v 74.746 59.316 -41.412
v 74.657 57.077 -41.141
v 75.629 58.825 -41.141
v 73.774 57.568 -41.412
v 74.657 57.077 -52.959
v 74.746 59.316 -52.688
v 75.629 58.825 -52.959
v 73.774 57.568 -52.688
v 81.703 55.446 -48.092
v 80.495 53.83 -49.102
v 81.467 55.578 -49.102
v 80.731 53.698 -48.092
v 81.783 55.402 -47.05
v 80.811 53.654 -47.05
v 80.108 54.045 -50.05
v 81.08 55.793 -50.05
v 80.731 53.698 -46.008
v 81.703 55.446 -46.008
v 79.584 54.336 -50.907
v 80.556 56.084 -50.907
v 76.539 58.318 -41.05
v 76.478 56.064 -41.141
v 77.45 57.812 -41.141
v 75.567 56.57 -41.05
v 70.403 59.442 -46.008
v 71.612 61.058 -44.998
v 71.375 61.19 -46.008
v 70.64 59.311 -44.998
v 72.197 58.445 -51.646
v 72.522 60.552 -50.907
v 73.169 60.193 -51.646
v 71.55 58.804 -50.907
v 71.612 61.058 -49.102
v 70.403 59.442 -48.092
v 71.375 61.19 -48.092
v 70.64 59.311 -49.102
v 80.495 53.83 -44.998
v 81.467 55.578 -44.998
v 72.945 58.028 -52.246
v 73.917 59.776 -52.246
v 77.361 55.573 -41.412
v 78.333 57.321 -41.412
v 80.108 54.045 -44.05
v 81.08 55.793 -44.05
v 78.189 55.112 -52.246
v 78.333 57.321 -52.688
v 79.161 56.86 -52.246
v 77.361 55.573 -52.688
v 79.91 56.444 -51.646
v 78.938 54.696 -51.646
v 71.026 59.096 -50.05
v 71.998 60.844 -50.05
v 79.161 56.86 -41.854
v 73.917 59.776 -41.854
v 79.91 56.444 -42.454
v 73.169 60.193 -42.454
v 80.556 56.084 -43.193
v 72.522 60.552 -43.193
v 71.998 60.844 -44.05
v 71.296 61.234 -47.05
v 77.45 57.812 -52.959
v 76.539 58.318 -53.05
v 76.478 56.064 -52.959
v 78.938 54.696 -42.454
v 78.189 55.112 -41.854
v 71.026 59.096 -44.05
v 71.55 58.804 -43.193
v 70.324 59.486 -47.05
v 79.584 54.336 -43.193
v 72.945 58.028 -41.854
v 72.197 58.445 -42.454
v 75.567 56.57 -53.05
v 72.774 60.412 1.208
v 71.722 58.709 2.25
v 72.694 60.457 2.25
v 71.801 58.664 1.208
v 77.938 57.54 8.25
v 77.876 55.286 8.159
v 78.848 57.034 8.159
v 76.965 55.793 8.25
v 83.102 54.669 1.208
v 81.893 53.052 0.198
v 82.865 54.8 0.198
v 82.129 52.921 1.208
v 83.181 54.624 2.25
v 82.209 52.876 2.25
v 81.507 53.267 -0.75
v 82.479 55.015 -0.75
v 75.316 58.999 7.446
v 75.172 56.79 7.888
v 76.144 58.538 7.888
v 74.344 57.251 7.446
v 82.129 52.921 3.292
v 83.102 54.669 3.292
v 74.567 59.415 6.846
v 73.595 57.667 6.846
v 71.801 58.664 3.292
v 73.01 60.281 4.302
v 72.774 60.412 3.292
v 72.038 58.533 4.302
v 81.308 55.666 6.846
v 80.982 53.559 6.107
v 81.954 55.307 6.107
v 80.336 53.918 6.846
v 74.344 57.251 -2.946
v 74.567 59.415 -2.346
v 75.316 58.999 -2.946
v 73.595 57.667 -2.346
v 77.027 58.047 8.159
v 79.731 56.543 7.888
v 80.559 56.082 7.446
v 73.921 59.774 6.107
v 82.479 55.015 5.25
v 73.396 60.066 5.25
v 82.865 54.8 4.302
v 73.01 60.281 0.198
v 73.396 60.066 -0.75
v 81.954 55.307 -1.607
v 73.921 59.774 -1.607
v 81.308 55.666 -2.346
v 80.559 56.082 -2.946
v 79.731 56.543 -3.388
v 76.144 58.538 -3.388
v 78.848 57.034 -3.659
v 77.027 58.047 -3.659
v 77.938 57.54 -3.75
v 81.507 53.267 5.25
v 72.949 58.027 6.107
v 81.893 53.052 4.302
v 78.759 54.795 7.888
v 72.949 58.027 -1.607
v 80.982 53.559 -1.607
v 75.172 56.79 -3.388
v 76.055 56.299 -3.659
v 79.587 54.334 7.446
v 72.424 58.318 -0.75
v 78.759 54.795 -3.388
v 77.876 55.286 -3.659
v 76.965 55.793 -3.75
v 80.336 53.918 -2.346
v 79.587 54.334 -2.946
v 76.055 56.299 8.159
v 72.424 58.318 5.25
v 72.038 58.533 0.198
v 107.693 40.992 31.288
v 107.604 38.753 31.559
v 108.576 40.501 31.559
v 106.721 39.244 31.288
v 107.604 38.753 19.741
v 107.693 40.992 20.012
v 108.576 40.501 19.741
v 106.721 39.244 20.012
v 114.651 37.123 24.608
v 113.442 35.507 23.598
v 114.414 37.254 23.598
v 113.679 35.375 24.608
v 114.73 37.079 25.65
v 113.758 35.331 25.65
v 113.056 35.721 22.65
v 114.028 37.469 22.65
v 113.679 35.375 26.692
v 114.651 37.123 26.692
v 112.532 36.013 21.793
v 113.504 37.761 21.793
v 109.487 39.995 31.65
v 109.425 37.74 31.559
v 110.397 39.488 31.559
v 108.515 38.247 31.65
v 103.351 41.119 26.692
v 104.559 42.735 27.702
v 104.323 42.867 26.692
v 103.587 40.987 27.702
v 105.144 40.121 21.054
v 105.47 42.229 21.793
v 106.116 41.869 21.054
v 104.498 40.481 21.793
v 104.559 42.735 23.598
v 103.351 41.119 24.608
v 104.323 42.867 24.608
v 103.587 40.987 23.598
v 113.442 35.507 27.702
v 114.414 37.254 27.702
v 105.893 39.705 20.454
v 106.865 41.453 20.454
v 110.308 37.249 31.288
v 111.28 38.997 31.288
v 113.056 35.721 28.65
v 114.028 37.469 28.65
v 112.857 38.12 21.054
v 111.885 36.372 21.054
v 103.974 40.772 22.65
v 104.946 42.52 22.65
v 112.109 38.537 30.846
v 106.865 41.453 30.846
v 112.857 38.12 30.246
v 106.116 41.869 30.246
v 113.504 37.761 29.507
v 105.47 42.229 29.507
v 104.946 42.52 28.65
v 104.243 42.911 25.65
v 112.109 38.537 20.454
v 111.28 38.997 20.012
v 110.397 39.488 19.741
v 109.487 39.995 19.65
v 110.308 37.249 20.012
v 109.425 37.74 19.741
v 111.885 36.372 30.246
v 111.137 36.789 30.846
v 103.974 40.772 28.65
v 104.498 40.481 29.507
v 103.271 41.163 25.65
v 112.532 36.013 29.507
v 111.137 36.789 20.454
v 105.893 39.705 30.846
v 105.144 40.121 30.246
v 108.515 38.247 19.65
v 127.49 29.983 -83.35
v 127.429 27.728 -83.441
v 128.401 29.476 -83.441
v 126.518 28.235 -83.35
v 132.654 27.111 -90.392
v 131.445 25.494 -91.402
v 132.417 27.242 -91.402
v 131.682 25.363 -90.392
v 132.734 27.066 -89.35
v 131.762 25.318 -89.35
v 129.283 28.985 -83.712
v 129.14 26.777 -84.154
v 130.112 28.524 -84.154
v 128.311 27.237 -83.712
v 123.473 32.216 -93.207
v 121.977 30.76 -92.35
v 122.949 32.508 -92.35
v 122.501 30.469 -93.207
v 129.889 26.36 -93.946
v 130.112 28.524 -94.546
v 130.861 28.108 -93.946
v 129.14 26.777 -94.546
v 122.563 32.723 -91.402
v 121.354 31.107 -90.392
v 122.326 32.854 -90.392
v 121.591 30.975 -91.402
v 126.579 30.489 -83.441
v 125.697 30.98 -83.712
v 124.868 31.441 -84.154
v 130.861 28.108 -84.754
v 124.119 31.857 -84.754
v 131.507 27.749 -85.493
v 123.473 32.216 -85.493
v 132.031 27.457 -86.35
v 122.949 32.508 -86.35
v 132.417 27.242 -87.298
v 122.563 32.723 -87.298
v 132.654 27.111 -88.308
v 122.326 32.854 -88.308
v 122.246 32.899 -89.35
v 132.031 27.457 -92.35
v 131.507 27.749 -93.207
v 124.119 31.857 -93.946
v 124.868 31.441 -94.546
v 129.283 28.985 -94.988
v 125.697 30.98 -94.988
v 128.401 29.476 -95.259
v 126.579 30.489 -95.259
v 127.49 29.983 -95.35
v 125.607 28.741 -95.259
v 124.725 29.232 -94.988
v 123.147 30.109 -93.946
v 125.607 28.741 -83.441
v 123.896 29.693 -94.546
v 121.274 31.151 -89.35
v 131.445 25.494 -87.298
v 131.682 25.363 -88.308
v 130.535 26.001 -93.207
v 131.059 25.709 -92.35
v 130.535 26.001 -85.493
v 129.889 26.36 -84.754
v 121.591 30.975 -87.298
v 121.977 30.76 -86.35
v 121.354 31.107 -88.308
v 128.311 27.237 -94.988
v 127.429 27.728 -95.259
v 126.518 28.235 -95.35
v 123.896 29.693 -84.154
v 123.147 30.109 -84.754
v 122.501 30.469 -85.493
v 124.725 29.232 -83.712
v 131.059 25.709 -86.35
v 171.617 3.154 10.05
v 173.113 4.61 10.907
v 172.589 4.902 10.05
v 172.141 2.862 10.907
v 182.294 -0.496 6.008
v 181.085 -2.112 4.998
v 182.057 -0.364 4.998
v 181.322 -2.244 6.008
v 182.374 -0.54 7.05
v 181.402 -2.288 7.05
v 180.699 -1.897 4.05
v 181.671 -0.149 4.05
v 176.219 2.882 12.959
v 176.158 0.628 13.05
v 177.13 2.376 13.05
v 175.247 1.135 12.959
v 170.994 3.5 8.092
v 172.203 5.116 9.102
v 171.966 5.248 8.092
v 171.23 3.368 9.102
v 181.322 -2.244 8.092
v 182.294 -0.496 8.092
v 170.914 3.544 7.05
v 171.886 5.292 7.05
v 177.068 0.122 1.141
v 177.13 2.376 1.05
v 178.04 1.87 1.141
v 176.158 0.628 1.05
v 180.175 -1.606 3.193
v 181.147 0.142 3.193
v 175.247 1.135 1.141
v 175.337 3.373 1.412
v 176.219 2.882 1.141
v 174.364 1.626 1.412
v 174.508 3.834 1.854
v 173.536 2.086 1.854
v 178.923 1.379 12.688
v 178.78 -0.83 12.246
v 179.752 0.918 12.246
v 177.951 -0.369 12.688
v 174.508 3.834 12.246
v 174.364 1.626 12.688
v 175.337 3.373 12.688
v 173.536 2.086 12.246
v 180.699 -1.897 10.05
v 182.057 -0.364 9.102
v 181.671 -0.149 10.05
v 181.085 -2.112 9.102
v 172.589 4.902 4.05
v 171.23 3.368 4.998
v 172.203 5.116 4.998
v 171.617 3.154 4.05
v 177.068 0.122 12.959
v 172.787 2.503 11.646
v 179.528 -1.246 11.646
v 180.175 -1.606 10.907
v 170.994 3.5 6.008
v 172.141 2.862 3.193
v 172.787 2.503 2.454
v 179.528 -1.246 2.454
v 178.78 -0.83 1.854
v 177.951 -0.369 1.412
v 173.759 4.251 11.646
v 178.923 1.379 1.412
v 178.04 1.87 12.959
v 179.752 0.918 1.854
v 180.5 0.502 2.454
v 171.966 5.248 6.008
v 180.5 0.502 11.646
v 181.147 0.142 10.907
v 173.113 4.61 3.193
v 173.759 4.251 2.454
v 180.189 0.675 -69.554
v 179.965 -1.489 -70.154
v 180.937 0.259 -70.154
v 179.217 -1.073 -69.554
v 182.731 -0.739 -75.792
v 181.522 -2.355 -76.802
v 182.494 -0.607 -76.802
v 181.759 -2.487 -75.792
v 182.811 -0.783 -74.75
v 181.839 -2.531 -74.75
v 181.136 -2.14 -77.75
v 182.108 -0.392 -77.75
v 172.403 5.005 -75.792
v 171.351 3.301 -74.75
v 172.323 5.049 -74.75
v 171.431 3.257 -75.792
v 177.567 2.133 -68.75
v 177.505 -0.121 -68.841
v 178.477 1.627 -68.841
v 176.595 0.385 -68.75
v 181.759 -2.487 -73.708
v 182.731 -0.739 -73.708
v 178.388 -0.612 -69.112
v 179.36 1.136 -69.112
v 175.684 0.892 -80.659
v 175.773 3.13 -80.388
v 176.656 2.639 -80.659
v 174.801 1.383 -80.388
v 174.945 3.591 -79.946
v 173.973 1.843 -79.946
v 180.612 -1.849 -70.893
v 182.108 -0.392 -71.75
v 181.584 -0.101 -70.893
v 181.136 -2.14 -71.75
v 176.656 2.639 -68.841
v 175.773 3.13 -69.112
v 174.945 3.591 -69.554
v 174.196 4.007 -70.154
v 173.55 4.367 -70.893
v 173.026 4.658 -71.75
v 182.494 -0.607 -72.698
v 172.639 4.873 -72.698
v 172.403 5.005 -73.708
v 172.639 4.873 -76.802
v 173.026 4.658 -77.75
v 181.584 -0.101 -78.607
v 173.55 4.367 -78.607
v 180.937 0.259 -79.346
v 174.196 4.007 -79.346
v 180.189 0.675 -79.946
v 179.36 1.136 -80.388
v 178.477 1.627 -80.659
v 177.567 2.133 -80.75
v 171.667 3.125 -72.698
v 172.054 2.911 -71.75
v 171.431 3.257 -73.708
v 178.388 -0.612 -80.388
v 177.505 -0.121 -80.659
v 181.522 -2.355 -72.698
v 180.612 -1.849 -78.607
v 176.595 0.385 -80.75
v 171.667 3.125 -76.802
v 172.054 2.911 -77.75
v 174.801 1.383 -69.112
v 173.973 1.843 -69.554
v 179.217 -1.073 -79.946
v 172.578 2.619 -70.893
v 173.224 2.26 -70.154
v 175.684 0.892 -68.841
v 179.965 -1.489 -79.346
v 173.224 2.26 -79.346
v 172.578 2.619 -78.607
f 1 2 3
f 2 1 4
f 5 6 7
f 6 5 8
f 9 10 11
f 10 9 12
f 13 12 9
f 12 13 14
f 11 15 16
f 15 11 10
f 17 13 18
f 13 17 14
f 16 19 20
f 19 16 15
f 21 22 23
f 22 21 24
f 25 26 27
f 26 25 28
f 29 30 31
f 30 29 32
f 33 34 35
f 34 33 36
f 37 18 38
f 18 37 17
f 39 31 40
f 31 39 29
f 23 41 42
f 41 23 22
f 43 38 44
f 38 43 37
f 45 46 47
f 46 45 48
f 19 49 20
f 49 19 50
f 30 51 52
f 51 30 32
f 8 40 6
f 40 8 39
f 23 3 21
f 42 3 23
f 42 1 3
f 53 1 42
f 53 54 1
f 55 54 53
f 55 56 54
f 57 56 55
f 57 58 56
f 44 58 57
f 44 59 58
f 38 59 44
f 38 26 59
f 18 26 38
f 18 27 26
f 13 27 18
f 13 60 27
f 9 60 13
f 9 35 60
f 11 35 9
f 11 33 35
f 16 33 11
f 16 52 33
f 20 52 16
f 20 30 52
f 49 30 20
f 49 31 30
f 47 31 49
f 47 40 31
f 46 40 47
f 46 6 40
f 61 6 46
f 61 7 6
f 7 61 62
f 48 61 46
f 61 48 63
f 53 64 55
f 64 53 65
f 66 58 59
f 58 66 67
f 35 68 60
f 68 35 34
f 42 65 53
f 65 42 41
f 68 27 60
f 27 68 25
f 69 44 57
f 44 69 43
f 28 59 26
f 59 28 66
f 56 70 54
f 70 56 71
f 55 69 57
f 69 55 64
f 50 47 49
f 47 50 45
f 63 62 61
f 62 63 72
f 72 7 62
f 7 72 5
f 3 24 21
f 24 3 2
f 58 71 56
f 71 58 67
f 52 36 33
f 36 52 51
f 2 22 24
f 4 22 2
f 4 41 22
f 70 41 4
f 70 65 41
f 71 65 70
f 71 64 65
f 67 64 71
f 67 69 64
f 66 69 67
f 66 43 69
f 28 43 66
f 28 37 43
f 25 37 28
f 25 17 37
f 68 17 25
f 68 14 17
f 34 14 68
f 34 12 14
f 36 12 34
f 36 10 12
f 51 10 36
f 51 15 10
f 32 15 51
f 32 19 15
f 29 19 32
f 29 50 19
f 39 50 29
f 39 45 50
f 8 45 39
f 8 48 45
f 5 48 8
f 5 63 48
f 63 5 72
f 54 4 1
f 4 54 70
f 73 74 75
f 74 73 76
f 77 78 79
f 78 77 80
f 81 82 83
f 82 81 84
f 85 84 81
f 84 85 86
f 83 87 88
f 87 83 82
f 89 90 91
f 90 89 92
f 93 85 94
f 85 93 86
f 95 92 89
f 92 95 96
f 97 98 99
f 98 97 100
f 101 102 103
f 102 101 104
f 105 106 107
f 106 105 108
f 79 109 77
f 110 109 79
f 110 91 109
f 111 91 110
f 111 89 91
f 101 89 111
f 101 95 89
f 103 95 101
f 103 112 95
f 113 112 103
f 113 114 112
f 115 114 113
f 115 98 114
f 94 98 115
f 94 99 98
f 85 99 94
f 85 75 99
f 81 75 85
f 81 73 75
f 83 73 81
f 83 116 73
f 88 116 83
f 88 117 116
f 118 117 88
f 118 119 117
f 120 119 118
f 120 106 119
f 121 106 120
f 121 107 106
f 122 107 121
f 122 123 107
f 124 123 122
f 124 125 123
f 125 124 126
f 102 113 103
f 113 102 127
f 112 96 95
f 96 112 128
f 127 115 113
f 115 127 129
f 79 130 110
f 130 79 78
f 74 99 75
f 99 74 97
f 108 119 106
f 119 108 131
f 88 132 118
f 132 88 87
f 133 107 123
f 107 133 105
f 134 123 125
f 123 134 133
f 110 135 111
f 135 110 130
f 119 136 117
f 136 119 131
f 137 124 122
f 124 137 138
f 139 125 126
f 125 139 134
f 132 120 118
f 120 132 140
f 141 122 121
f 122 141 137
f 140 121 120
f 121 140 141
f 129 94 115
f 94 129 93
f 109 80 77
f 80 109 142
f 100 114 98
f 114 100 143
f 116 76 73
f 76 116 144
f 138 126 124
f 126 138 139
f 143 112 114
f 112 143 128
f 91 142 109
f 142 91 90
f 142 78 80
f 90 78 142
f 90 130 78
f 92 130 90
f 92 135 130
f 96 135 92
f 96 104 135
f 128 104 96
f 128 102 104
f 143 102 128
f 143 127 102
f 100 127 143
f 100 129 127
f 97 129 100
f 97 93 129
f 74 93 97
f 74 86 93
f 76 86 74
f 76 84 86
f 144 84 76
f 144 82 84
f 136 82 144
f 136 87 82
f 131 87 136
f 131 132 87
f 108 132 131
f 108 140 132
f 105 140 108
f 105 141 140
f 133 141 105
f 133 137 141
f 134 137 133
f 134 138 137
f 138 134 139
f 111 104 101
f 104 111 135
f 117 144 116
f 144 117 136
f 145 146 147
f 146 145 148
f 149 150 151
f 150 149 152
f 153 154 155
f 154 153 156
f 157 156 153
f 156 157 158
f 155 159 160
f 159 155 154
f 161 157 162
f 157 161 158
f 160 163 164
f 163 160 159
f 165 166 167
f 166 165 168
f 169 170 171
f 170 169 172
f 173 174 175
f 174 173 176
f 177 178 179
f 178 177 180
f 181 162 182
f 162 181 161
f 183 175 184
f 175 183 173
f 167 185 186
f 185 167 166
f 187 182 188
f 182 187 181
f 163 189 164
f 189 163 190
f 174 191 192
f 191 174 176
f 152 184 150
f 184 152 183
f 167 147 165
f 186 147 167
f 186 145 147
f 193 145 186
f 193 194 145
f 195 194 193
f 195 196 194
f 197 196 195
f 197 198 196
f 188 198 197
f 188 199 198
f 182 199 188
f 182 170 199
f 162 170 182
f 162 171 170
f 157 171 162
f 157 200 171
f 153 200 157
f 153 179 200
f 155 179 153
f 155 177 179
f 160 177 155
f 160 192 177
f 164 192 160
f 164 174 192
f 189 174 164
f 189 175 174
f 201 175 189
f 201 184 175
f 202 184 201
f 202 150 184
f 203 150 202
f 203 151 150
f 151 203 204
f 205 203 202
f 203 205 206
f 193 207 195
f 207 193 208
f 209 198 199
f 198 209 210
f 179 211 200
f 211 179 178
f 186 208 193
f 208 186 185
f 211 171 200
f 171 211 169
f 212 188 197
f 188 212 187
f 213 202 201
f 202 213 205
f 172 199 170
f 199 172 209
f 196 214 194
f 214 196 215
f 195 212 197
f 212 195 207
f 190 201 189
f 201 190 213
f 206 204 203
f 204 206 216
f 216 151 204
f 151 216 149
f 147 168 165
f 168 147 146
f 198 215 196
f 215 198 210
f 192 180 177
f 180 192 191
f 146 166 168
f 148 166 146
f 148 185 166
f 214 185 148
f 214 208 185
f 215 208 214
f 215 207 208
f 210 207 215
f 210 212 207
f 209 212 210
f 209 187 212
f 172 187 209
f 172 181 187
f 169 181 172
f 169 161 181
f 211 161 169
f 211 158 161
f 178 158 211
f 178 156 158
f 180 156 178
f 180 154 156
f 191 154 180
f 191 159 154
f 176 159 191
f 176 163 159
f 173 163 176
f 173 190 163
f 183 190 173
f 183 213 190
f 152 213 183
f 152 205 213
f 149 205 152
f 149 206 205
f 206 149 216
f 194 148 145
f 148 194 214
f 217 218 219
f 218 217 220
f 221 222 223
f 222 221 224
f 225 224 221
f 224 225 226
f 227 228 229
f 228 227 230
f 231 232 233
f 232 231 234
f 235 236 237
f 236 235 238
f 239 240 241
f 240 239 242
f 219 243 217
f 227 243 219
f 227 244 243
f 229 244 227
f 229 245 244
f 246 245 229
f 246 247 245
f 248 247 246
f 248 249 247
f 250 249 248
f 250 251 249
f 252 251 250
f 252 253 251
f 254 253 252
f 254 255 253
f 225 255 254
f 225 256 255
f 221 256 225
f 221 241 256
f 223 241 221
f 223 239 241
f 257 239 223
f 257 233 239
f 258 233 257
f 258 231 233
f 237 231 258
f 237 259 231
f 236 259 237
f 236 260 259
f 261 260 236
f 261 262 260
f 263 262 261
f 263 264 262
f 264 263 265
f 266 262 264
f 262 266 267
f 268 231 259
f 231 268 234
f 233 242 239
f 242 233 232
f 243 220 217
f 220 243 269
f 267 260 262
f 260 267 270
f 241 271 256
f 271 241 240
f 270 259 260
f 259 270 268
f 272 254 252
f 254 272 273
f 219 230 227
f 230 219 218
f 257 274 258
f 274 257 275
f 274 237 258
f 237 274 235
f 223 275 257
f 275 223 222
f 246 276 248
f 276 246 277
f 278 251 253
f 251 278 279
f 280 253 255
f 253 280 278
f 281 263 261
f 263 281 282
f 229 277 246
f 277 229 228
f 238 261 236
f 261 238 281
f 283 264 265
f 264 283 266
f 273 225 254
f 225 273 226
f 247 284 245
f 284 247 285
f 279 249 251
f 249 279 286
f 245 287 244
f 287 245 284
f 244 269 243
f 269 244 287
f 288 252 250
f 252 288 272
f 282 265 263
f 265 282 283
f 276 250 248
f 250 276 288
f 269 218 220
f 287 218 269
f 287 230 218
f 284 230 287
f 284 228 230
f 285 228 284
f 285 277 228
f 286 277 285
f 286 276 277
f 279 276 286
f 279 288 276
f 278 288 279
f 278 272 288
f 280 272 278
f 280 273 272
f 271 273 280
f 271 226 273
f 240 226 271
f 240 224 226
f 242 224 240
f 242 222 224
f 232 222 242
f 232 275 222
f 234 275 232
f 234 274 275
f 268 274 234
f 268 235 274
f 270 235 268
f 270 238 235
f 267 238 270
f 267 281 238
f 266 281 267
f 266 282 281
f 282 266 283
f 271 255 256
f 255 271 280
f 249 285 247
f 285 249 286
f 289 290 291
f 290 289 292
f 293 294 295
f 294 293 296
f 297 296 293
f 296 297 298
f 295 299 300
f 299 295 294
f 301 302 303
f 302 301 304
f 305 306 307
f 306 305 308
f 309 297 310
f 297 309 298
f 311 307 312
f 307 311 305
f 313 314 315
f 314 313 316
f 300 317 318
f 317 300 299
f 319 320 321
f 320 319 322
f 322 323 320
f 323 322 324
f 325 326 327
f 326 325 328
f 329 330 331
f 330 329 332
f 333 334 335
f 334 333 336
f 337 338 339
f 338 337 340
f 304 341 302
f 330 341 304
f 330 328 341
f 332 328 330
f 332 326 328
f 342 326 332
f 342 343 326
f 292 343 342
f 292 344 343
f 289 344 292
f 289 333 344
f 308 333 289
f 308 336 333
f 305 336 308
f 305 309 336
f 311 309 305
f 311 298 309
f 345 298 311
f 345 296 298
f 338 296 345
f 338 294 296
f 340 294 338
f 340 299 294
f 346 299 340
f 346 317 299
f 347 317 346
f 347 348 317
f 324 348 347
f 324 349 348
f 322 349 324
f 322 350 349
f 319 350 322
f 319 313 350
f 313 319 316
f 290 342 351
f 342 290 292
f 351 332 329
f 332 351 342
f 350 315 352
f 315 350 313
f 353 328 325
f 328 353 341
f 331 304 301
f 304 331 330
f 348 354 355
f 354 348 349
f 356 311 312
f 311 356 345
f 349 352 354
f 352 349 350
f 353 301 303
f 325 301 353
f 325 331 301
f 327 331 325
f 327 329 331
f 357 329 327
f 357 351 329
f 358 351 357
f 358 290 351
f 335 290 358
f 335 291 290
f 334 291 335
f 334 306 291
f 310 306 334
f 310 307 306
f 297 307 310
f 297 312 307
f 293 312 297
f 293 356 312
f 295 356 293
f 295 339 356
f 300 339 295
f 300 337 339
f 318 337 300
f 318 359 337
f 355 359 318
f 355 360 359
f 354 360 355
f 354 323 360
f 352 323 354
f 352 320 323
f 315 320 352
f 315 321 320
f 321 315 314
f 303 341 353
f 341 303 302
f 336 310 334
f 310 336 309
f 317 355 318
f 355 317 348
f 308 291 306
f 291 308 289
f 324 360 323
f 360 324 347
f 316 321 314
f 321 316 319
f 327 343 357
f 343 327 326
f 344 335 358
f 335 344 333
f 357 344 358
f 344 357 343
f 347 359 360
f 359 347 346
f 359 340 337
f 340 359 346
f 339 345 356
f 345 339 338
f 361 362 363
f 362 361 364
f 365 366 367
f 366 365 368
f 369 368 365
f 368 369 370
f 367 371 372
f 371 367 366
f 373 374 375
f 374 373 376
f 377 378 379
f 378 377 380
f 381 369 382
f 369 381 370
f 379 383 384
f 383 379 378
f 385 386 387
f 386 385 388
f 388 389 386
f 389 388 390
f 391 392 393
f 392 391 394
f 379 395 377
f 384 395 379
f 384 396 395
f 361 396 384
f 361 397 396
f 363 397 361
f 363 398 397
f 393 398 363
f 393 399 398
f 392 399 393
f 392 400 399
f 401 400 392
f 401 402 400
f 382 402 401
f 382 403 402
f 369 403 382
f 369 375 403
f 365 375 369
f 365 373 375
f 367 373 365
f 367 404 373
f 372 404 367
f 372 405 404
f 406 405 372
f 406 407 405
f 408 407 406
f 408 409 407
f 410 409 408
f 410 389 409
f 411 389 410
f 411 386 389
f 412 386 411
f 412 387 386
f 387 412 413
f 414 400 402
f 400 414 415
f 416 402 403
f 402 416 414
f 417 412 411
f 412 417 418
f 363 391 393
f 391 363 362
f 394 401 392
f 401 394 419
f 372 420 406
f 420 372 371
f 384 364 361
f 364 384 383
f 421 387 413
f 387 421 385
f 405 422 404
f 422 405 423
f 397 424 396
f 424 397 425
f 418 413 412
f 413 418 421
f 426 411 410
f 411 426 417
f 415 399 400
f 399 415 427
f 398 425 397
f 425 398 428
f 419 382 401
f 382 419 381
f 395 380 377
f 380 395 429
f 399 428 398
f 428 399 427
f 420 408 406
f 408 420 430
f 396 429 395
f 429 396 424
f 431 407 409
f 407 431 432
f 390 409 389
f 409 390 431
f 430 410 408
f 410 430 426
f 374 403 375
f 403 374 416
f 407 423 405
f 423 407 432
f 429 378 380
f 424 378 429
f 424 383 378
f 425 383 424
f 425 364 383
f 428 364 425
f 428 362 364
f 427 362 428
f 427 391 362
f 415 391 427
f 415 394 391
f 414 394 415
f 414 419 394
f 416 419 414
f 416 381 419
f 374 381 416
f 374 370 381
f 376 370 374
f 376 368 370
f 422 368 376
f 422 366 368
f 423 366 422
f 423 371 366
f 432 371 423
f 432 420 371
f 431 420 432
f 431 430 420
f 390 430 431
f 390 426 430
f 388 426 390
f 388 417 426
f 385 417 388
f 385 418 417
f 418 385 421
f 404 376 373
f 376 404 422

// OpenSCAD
// file: _pts.scad
PTS=[[134.9-181,40.6],[136.5-181,-8.7],[172.6-181,-32.1],[193.2-181,82.9],[250.0-181,-13.5],[250.5-181,68.3]];
module discs(zc){ for(p=PTS) translate([p[0],p[1],zc]) cylinder(h=2,d=12,center=true,$fn=36); }
// main file
include <_pts.scad>
translate([117.8,37.66,-6.45]) rotate([0,0,-29.08]) rotate([-90,0,0]) discs(-3);
